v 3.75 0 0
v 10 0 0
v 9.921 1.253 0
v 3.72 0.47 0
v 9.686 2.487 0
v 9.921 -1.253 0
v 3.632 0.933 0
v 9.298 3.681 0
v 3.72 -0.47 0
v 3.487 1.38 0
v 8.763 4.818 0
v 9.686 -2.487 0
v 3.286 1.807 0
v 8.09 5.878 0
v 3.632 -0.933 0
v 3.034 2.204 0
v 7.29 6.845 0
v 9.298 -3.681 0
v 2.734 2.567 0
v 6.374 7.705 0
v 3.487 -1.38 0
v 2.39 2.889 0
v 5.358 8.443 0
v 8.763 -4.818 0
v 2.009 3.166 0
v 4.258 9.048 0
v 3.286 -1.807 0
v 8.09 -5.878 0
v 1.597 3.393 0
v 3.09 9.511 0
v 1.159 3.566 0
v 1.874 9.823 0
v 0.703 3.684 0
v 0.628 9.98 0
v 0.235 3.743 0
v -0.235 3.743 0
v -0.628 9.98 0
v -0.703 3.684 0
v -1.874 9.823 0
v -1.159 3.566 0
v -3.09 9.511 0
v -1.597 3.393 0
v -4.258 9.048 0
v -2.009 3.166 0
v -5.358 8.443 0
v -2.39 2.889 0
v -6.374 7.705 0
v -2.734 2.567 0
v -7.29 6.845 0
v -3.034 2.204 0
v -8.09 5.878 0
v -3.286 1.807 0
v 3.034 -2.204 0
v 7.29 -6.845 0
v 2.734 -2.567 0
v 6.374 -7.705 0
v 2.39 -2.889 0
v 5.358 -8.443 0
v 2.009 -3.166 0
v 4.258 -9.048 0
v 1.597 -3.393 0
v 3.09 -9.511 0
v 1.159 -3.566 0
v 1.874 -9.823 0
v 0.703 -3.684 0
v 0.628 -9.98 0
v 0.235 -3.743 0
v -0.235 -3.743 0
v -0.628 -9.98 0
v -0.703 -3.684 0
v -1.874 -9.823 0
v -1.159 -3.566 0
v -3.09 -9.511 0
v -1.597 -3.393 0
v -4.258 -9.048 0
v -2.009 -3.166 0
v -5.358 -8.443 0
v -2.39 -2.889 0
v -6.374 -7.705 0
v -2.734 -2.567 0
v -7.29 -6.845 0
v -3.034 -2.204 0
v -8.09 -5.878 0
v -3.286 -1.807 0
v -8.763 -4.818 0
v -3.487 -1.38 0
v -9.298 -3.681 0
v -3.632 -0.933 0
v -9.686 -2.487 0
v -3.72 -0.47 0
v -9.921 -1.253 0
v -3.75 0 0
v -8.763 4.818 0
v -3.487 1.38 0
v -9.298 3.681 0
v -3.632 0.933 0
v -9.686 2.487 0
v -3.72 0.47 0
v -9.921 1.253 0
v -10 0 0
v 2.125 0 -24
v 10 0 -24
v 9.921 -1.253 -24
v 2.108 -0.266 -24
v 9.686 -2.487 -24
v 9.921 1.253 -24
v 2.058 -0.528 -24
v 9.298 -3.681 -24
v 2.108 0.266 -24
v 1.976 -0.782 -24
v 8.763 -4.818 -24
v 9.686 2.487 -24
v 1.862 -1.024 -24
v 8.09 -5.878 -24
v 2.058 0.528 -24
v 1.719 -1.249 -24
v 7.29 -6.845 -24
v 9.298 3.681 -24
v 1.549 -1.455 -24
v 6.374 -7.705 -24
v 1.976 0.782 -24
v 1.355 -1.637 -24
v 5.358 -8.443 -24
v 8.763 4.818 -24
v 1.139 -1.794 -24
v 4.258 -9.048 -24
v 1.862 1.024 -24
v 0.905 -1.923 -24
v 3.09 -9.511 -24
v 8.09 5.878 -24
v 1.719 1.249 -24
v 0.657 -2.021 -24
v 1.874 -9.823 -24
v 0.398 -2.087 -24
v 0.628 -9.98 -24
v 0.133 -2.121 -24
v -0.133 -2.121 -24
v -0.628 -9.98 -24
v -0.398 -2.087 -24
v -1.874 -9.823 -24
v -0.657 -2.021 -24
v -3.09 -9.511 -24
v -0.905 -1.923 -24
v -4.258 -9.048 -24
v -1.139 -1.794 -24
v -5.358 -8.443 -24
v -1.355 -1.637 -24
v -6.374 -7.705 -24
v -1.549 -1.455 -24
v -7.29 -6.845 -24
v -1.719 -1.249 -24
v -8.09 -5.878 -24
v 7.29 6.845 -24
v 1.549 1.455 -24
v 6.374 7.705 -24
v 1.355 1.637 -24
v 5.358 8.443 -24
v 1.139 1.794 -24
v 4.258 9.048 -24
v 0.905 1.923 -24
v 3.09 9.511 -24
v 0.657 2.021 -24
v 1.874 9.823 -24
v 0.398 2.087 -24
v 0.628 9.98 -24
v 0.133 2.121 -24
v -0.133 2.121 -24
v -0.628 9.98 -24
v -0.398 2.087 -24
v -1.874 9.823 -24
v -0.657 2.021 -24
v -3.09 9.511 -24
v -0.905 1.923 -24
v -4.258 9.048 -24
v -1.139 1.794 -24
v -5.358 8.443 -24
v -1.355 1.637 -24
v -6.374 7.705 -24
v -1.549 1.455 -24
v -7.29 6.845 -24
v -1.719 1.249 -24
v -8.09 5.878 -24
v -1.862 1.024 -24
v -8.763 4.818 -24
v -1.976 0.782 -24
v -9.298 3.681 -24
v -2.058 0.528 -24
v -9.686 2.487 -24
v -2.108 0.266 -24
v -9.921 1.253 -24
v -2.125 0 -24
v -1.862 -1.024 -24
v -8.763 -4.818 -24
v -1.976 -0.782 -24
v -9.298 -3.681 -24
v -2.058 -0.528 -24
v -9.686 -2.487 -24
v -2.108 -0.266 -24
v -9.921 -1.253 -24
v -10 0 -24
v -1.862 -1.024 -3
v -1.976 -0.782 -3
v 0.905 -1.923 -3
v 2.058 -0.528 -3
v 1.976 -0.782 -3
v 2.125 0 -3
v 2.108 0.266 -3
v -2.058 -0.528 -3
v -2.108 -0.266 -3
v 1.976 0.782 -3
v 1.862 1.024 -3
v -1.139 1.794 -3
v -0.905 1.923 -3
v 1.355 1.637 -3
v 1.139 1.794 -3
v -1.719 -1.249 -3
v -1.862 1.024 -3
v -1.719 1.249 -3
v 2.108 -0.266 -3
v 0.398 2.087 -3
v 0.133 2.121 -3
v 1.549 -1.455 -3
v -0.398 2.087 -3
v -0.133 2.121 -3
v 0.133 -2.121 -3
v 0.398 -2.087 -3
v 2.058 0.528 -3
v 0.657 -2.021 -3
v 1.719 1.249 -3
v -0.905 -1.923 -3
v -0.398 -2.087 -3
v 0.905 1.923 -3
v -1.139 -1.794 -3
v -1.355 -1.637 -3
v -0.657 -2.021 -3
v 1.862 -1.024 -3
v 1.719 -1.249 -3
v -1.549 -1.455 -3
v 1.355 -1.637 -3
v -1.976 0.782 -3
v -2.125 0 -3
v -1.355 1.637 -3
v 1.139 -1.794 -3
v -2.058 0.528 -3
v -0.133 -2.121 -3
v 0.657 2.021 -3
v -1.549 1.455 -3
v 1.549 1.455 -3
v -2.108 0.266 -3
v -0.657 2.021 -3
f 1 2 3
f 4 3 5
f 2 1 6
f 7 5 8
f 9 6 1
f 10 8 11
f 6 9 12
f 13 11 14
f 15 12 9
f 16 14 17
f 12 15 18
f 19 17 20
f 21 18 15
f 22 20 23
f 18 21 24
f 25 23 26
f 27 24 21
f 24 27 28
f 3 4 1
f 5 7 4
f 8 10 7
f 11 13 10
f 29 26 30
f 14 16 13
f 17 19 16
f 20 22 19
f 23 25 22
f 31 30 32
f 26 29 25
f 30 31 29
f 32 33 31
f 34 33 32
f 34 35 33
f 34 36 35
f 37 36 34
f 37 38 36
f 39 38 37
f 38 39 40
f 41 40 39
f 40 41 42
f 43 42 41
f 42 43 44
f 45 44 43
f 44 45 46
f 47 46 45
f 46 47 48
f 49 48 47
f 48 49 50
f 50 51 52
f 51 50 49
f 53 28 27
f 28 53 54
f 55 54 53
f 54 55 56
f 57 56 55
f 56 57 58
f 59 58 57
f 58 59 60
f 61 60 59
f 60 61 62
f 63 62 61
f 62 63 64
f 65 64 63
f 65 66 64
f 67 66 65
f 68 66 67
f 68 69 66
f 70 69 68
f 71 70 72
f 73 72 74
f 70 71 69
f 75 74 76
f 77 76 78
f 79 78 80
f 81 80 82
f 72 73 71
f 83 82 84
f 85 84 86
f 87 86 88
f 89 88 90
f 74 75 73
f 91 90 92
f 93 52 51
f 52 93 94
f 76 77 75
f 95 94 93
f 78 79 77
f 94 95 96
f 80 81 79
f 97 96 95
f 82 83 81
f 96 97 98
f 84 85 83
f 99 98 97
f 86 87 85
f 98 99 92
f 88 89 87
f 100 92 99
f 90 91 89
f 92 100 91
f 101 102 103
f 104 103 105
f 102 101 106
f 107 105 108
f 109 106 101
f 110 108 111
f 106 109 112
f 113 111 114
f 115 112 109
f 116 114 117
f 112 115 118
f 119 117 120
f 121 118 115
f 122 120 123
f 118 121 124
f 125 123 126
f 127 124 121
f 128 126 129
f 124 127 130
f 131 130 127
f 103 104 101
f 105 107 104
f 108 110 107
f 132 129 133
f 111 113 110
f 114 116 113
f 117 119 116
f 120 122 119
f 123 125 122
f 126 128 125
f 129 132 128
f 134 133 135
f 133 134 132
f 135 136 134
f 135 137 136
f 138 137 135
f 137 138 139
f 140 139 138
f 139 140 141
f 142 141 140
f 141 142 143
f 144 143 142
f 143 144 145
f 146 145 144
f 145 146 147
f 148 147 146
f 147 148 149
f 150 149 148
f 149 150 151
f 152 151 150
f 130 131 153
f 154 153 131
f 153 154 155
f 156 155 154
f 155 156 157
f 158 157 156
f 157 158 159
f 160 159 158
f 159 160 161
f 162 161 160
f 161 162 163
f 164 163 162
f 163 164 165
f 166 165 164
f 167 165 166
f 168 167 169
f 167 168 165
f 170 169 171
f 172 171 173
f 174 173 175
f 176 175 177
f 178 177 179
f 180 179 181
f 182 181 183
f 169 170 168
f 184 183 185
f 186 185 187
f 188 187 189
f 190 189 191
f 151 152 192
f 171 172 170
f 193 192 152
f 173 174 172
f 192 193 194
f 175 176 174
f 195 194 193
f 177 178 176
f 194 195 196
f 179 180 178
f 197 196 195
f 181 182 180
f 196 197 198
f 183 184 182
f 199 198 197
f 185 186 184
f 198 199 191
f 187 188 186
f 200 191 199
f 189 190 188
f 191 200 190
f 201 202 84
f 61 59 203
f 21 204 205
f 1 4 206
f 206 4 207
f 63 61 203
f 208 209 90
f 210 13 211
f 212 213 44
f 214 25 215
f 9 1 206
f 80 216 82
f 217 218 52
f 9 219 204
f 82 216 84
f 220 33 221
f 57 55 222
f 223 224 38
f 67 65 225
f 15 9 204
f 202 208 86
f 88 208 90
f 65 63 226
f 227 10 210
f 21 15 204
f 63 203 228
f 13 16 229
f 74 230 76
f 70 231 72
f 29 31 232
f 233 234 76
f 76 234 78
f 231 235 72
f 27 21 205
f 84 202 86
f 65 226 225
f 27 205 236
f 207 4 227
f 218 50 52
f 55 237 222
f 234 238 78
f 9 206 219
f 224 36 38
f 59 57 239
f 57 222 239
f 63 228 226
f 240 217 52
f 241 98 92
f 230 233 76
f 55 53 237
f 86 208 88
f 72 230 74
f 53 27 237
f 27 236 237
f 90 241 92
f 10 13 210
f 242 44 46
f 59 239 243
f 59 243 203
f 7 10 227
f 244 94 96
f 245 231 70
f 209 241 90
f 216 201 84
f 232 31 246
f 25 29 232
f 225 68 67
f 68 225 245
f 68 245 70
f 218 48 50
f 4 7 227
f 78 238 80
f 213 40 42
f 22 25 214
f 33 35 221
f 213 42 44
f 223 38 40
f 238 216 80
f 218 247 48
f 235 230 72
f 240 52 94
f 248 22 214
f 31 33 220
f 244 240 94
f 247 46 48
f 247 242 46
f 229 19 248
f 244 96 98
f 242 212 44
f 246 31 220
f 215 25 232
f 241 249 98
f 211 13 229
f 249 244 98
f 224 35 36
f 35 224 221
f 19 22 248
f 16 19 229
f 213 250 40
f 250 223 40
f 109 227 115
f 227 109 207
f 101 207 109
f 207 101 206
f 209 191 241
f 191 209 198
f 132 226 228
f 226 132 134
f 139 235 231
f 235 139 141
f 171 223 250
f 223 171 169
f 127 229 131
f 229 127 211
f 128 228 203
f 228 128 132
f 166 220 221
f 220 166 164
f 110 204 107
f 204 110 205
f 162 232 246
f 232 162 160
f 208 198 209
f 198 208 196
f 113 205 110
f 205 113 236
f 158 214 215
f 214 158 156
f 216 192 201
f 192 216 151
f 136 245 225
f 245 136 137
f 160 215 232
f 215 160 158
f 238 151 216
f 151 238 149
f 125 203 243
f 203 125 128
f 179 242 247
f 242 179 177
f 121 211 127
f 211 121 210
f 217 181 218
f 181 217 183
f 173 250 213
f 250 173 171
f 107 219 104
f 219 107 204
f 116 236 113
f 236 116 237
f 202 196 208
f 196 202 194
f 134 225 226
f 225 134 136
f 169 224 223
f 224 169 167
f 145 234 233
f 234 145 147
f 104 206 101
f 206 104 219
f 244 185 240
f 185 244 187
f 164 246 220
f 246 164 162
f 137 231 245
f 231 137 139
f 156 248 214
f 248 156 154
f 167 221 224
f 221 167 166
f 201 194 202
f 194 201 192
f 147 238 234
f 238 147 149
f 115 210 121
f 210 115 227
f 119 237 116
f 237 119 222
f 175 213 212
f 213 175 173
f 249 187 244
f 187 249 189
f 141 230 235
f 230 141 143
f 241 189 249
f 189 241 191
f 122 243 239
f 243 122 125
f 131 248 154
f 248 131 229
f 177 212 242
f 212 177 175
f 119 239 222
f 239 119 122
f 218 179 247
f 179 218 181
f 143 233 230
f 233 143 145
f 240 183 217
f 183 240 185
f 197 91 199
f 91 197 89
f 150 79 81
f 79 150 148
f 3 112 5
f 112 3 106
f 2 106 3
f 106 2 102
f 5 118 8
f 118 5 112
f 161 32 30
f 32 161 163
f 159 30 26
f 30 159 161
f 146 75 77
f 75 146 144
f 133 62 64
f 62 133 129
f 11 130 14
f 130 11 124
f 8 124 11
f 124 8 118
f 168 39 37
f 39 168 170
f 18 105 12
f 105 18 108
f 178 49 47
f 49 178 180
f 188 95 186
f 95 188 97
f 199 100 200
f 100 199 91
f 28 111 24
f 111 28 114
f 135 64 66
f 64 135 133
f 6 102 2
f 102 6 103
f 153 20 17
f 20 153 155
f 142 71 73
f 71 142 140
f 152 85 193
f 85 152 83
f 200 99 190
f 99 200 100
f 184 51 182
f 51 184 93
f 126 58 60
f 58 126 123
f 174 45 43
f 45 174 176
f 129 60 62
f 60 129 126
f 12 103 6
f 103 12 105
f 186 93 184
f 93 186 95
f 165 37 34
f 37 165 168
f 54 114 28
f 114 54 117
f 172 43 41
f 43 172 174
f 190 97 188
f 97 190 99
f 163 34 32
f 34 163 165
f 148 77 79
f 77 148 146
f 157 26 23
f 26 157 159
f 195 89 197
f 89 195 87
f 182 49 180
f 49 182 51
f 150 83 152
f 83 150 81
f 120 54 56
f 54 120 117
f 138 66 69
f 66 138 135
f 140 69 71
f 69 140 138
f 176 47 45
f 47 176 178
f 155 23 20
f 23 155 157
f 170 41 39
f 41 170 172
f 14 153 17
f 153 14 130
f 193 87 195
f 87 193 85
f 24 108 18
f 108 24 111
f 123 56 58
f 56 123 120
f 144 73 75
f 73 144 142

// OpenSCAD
$fn = 50;


difference() {
	union() {
		translate(v = [0, 0, -24.0000000000]) {
			cylinder(h = 24, r = 10.0000000000);
		}
		cylinder(h = 0, r = 13.0000000000);
	}
	union() {
		translate(v = [0, 0, 0]) {
			rotate(a = [0, 0, 0]) {
				difference() {
					union() {
						#translate(v = [0, 0, -24.0000000000]) {
							cylinder(h = 24, r = 2.0000000000);
						}
						#translate(v = [0, 0, -3]) {
							cylinder(h = 3, r = 10.0000000000, r1 = 2.1250000000, r2 = 3.7500000000);
						}
						#translate(v = [0, 0, -24.0000000000]) {
							cylinder(h = 24, r = 2.1250000000);
						}
						#translate(v = [0, 0, -24.0000000000]) {
							cylinder(h = 24, r = 2.0000000000);
						}
					}
					union();
				}
			}
		}
	}
}
